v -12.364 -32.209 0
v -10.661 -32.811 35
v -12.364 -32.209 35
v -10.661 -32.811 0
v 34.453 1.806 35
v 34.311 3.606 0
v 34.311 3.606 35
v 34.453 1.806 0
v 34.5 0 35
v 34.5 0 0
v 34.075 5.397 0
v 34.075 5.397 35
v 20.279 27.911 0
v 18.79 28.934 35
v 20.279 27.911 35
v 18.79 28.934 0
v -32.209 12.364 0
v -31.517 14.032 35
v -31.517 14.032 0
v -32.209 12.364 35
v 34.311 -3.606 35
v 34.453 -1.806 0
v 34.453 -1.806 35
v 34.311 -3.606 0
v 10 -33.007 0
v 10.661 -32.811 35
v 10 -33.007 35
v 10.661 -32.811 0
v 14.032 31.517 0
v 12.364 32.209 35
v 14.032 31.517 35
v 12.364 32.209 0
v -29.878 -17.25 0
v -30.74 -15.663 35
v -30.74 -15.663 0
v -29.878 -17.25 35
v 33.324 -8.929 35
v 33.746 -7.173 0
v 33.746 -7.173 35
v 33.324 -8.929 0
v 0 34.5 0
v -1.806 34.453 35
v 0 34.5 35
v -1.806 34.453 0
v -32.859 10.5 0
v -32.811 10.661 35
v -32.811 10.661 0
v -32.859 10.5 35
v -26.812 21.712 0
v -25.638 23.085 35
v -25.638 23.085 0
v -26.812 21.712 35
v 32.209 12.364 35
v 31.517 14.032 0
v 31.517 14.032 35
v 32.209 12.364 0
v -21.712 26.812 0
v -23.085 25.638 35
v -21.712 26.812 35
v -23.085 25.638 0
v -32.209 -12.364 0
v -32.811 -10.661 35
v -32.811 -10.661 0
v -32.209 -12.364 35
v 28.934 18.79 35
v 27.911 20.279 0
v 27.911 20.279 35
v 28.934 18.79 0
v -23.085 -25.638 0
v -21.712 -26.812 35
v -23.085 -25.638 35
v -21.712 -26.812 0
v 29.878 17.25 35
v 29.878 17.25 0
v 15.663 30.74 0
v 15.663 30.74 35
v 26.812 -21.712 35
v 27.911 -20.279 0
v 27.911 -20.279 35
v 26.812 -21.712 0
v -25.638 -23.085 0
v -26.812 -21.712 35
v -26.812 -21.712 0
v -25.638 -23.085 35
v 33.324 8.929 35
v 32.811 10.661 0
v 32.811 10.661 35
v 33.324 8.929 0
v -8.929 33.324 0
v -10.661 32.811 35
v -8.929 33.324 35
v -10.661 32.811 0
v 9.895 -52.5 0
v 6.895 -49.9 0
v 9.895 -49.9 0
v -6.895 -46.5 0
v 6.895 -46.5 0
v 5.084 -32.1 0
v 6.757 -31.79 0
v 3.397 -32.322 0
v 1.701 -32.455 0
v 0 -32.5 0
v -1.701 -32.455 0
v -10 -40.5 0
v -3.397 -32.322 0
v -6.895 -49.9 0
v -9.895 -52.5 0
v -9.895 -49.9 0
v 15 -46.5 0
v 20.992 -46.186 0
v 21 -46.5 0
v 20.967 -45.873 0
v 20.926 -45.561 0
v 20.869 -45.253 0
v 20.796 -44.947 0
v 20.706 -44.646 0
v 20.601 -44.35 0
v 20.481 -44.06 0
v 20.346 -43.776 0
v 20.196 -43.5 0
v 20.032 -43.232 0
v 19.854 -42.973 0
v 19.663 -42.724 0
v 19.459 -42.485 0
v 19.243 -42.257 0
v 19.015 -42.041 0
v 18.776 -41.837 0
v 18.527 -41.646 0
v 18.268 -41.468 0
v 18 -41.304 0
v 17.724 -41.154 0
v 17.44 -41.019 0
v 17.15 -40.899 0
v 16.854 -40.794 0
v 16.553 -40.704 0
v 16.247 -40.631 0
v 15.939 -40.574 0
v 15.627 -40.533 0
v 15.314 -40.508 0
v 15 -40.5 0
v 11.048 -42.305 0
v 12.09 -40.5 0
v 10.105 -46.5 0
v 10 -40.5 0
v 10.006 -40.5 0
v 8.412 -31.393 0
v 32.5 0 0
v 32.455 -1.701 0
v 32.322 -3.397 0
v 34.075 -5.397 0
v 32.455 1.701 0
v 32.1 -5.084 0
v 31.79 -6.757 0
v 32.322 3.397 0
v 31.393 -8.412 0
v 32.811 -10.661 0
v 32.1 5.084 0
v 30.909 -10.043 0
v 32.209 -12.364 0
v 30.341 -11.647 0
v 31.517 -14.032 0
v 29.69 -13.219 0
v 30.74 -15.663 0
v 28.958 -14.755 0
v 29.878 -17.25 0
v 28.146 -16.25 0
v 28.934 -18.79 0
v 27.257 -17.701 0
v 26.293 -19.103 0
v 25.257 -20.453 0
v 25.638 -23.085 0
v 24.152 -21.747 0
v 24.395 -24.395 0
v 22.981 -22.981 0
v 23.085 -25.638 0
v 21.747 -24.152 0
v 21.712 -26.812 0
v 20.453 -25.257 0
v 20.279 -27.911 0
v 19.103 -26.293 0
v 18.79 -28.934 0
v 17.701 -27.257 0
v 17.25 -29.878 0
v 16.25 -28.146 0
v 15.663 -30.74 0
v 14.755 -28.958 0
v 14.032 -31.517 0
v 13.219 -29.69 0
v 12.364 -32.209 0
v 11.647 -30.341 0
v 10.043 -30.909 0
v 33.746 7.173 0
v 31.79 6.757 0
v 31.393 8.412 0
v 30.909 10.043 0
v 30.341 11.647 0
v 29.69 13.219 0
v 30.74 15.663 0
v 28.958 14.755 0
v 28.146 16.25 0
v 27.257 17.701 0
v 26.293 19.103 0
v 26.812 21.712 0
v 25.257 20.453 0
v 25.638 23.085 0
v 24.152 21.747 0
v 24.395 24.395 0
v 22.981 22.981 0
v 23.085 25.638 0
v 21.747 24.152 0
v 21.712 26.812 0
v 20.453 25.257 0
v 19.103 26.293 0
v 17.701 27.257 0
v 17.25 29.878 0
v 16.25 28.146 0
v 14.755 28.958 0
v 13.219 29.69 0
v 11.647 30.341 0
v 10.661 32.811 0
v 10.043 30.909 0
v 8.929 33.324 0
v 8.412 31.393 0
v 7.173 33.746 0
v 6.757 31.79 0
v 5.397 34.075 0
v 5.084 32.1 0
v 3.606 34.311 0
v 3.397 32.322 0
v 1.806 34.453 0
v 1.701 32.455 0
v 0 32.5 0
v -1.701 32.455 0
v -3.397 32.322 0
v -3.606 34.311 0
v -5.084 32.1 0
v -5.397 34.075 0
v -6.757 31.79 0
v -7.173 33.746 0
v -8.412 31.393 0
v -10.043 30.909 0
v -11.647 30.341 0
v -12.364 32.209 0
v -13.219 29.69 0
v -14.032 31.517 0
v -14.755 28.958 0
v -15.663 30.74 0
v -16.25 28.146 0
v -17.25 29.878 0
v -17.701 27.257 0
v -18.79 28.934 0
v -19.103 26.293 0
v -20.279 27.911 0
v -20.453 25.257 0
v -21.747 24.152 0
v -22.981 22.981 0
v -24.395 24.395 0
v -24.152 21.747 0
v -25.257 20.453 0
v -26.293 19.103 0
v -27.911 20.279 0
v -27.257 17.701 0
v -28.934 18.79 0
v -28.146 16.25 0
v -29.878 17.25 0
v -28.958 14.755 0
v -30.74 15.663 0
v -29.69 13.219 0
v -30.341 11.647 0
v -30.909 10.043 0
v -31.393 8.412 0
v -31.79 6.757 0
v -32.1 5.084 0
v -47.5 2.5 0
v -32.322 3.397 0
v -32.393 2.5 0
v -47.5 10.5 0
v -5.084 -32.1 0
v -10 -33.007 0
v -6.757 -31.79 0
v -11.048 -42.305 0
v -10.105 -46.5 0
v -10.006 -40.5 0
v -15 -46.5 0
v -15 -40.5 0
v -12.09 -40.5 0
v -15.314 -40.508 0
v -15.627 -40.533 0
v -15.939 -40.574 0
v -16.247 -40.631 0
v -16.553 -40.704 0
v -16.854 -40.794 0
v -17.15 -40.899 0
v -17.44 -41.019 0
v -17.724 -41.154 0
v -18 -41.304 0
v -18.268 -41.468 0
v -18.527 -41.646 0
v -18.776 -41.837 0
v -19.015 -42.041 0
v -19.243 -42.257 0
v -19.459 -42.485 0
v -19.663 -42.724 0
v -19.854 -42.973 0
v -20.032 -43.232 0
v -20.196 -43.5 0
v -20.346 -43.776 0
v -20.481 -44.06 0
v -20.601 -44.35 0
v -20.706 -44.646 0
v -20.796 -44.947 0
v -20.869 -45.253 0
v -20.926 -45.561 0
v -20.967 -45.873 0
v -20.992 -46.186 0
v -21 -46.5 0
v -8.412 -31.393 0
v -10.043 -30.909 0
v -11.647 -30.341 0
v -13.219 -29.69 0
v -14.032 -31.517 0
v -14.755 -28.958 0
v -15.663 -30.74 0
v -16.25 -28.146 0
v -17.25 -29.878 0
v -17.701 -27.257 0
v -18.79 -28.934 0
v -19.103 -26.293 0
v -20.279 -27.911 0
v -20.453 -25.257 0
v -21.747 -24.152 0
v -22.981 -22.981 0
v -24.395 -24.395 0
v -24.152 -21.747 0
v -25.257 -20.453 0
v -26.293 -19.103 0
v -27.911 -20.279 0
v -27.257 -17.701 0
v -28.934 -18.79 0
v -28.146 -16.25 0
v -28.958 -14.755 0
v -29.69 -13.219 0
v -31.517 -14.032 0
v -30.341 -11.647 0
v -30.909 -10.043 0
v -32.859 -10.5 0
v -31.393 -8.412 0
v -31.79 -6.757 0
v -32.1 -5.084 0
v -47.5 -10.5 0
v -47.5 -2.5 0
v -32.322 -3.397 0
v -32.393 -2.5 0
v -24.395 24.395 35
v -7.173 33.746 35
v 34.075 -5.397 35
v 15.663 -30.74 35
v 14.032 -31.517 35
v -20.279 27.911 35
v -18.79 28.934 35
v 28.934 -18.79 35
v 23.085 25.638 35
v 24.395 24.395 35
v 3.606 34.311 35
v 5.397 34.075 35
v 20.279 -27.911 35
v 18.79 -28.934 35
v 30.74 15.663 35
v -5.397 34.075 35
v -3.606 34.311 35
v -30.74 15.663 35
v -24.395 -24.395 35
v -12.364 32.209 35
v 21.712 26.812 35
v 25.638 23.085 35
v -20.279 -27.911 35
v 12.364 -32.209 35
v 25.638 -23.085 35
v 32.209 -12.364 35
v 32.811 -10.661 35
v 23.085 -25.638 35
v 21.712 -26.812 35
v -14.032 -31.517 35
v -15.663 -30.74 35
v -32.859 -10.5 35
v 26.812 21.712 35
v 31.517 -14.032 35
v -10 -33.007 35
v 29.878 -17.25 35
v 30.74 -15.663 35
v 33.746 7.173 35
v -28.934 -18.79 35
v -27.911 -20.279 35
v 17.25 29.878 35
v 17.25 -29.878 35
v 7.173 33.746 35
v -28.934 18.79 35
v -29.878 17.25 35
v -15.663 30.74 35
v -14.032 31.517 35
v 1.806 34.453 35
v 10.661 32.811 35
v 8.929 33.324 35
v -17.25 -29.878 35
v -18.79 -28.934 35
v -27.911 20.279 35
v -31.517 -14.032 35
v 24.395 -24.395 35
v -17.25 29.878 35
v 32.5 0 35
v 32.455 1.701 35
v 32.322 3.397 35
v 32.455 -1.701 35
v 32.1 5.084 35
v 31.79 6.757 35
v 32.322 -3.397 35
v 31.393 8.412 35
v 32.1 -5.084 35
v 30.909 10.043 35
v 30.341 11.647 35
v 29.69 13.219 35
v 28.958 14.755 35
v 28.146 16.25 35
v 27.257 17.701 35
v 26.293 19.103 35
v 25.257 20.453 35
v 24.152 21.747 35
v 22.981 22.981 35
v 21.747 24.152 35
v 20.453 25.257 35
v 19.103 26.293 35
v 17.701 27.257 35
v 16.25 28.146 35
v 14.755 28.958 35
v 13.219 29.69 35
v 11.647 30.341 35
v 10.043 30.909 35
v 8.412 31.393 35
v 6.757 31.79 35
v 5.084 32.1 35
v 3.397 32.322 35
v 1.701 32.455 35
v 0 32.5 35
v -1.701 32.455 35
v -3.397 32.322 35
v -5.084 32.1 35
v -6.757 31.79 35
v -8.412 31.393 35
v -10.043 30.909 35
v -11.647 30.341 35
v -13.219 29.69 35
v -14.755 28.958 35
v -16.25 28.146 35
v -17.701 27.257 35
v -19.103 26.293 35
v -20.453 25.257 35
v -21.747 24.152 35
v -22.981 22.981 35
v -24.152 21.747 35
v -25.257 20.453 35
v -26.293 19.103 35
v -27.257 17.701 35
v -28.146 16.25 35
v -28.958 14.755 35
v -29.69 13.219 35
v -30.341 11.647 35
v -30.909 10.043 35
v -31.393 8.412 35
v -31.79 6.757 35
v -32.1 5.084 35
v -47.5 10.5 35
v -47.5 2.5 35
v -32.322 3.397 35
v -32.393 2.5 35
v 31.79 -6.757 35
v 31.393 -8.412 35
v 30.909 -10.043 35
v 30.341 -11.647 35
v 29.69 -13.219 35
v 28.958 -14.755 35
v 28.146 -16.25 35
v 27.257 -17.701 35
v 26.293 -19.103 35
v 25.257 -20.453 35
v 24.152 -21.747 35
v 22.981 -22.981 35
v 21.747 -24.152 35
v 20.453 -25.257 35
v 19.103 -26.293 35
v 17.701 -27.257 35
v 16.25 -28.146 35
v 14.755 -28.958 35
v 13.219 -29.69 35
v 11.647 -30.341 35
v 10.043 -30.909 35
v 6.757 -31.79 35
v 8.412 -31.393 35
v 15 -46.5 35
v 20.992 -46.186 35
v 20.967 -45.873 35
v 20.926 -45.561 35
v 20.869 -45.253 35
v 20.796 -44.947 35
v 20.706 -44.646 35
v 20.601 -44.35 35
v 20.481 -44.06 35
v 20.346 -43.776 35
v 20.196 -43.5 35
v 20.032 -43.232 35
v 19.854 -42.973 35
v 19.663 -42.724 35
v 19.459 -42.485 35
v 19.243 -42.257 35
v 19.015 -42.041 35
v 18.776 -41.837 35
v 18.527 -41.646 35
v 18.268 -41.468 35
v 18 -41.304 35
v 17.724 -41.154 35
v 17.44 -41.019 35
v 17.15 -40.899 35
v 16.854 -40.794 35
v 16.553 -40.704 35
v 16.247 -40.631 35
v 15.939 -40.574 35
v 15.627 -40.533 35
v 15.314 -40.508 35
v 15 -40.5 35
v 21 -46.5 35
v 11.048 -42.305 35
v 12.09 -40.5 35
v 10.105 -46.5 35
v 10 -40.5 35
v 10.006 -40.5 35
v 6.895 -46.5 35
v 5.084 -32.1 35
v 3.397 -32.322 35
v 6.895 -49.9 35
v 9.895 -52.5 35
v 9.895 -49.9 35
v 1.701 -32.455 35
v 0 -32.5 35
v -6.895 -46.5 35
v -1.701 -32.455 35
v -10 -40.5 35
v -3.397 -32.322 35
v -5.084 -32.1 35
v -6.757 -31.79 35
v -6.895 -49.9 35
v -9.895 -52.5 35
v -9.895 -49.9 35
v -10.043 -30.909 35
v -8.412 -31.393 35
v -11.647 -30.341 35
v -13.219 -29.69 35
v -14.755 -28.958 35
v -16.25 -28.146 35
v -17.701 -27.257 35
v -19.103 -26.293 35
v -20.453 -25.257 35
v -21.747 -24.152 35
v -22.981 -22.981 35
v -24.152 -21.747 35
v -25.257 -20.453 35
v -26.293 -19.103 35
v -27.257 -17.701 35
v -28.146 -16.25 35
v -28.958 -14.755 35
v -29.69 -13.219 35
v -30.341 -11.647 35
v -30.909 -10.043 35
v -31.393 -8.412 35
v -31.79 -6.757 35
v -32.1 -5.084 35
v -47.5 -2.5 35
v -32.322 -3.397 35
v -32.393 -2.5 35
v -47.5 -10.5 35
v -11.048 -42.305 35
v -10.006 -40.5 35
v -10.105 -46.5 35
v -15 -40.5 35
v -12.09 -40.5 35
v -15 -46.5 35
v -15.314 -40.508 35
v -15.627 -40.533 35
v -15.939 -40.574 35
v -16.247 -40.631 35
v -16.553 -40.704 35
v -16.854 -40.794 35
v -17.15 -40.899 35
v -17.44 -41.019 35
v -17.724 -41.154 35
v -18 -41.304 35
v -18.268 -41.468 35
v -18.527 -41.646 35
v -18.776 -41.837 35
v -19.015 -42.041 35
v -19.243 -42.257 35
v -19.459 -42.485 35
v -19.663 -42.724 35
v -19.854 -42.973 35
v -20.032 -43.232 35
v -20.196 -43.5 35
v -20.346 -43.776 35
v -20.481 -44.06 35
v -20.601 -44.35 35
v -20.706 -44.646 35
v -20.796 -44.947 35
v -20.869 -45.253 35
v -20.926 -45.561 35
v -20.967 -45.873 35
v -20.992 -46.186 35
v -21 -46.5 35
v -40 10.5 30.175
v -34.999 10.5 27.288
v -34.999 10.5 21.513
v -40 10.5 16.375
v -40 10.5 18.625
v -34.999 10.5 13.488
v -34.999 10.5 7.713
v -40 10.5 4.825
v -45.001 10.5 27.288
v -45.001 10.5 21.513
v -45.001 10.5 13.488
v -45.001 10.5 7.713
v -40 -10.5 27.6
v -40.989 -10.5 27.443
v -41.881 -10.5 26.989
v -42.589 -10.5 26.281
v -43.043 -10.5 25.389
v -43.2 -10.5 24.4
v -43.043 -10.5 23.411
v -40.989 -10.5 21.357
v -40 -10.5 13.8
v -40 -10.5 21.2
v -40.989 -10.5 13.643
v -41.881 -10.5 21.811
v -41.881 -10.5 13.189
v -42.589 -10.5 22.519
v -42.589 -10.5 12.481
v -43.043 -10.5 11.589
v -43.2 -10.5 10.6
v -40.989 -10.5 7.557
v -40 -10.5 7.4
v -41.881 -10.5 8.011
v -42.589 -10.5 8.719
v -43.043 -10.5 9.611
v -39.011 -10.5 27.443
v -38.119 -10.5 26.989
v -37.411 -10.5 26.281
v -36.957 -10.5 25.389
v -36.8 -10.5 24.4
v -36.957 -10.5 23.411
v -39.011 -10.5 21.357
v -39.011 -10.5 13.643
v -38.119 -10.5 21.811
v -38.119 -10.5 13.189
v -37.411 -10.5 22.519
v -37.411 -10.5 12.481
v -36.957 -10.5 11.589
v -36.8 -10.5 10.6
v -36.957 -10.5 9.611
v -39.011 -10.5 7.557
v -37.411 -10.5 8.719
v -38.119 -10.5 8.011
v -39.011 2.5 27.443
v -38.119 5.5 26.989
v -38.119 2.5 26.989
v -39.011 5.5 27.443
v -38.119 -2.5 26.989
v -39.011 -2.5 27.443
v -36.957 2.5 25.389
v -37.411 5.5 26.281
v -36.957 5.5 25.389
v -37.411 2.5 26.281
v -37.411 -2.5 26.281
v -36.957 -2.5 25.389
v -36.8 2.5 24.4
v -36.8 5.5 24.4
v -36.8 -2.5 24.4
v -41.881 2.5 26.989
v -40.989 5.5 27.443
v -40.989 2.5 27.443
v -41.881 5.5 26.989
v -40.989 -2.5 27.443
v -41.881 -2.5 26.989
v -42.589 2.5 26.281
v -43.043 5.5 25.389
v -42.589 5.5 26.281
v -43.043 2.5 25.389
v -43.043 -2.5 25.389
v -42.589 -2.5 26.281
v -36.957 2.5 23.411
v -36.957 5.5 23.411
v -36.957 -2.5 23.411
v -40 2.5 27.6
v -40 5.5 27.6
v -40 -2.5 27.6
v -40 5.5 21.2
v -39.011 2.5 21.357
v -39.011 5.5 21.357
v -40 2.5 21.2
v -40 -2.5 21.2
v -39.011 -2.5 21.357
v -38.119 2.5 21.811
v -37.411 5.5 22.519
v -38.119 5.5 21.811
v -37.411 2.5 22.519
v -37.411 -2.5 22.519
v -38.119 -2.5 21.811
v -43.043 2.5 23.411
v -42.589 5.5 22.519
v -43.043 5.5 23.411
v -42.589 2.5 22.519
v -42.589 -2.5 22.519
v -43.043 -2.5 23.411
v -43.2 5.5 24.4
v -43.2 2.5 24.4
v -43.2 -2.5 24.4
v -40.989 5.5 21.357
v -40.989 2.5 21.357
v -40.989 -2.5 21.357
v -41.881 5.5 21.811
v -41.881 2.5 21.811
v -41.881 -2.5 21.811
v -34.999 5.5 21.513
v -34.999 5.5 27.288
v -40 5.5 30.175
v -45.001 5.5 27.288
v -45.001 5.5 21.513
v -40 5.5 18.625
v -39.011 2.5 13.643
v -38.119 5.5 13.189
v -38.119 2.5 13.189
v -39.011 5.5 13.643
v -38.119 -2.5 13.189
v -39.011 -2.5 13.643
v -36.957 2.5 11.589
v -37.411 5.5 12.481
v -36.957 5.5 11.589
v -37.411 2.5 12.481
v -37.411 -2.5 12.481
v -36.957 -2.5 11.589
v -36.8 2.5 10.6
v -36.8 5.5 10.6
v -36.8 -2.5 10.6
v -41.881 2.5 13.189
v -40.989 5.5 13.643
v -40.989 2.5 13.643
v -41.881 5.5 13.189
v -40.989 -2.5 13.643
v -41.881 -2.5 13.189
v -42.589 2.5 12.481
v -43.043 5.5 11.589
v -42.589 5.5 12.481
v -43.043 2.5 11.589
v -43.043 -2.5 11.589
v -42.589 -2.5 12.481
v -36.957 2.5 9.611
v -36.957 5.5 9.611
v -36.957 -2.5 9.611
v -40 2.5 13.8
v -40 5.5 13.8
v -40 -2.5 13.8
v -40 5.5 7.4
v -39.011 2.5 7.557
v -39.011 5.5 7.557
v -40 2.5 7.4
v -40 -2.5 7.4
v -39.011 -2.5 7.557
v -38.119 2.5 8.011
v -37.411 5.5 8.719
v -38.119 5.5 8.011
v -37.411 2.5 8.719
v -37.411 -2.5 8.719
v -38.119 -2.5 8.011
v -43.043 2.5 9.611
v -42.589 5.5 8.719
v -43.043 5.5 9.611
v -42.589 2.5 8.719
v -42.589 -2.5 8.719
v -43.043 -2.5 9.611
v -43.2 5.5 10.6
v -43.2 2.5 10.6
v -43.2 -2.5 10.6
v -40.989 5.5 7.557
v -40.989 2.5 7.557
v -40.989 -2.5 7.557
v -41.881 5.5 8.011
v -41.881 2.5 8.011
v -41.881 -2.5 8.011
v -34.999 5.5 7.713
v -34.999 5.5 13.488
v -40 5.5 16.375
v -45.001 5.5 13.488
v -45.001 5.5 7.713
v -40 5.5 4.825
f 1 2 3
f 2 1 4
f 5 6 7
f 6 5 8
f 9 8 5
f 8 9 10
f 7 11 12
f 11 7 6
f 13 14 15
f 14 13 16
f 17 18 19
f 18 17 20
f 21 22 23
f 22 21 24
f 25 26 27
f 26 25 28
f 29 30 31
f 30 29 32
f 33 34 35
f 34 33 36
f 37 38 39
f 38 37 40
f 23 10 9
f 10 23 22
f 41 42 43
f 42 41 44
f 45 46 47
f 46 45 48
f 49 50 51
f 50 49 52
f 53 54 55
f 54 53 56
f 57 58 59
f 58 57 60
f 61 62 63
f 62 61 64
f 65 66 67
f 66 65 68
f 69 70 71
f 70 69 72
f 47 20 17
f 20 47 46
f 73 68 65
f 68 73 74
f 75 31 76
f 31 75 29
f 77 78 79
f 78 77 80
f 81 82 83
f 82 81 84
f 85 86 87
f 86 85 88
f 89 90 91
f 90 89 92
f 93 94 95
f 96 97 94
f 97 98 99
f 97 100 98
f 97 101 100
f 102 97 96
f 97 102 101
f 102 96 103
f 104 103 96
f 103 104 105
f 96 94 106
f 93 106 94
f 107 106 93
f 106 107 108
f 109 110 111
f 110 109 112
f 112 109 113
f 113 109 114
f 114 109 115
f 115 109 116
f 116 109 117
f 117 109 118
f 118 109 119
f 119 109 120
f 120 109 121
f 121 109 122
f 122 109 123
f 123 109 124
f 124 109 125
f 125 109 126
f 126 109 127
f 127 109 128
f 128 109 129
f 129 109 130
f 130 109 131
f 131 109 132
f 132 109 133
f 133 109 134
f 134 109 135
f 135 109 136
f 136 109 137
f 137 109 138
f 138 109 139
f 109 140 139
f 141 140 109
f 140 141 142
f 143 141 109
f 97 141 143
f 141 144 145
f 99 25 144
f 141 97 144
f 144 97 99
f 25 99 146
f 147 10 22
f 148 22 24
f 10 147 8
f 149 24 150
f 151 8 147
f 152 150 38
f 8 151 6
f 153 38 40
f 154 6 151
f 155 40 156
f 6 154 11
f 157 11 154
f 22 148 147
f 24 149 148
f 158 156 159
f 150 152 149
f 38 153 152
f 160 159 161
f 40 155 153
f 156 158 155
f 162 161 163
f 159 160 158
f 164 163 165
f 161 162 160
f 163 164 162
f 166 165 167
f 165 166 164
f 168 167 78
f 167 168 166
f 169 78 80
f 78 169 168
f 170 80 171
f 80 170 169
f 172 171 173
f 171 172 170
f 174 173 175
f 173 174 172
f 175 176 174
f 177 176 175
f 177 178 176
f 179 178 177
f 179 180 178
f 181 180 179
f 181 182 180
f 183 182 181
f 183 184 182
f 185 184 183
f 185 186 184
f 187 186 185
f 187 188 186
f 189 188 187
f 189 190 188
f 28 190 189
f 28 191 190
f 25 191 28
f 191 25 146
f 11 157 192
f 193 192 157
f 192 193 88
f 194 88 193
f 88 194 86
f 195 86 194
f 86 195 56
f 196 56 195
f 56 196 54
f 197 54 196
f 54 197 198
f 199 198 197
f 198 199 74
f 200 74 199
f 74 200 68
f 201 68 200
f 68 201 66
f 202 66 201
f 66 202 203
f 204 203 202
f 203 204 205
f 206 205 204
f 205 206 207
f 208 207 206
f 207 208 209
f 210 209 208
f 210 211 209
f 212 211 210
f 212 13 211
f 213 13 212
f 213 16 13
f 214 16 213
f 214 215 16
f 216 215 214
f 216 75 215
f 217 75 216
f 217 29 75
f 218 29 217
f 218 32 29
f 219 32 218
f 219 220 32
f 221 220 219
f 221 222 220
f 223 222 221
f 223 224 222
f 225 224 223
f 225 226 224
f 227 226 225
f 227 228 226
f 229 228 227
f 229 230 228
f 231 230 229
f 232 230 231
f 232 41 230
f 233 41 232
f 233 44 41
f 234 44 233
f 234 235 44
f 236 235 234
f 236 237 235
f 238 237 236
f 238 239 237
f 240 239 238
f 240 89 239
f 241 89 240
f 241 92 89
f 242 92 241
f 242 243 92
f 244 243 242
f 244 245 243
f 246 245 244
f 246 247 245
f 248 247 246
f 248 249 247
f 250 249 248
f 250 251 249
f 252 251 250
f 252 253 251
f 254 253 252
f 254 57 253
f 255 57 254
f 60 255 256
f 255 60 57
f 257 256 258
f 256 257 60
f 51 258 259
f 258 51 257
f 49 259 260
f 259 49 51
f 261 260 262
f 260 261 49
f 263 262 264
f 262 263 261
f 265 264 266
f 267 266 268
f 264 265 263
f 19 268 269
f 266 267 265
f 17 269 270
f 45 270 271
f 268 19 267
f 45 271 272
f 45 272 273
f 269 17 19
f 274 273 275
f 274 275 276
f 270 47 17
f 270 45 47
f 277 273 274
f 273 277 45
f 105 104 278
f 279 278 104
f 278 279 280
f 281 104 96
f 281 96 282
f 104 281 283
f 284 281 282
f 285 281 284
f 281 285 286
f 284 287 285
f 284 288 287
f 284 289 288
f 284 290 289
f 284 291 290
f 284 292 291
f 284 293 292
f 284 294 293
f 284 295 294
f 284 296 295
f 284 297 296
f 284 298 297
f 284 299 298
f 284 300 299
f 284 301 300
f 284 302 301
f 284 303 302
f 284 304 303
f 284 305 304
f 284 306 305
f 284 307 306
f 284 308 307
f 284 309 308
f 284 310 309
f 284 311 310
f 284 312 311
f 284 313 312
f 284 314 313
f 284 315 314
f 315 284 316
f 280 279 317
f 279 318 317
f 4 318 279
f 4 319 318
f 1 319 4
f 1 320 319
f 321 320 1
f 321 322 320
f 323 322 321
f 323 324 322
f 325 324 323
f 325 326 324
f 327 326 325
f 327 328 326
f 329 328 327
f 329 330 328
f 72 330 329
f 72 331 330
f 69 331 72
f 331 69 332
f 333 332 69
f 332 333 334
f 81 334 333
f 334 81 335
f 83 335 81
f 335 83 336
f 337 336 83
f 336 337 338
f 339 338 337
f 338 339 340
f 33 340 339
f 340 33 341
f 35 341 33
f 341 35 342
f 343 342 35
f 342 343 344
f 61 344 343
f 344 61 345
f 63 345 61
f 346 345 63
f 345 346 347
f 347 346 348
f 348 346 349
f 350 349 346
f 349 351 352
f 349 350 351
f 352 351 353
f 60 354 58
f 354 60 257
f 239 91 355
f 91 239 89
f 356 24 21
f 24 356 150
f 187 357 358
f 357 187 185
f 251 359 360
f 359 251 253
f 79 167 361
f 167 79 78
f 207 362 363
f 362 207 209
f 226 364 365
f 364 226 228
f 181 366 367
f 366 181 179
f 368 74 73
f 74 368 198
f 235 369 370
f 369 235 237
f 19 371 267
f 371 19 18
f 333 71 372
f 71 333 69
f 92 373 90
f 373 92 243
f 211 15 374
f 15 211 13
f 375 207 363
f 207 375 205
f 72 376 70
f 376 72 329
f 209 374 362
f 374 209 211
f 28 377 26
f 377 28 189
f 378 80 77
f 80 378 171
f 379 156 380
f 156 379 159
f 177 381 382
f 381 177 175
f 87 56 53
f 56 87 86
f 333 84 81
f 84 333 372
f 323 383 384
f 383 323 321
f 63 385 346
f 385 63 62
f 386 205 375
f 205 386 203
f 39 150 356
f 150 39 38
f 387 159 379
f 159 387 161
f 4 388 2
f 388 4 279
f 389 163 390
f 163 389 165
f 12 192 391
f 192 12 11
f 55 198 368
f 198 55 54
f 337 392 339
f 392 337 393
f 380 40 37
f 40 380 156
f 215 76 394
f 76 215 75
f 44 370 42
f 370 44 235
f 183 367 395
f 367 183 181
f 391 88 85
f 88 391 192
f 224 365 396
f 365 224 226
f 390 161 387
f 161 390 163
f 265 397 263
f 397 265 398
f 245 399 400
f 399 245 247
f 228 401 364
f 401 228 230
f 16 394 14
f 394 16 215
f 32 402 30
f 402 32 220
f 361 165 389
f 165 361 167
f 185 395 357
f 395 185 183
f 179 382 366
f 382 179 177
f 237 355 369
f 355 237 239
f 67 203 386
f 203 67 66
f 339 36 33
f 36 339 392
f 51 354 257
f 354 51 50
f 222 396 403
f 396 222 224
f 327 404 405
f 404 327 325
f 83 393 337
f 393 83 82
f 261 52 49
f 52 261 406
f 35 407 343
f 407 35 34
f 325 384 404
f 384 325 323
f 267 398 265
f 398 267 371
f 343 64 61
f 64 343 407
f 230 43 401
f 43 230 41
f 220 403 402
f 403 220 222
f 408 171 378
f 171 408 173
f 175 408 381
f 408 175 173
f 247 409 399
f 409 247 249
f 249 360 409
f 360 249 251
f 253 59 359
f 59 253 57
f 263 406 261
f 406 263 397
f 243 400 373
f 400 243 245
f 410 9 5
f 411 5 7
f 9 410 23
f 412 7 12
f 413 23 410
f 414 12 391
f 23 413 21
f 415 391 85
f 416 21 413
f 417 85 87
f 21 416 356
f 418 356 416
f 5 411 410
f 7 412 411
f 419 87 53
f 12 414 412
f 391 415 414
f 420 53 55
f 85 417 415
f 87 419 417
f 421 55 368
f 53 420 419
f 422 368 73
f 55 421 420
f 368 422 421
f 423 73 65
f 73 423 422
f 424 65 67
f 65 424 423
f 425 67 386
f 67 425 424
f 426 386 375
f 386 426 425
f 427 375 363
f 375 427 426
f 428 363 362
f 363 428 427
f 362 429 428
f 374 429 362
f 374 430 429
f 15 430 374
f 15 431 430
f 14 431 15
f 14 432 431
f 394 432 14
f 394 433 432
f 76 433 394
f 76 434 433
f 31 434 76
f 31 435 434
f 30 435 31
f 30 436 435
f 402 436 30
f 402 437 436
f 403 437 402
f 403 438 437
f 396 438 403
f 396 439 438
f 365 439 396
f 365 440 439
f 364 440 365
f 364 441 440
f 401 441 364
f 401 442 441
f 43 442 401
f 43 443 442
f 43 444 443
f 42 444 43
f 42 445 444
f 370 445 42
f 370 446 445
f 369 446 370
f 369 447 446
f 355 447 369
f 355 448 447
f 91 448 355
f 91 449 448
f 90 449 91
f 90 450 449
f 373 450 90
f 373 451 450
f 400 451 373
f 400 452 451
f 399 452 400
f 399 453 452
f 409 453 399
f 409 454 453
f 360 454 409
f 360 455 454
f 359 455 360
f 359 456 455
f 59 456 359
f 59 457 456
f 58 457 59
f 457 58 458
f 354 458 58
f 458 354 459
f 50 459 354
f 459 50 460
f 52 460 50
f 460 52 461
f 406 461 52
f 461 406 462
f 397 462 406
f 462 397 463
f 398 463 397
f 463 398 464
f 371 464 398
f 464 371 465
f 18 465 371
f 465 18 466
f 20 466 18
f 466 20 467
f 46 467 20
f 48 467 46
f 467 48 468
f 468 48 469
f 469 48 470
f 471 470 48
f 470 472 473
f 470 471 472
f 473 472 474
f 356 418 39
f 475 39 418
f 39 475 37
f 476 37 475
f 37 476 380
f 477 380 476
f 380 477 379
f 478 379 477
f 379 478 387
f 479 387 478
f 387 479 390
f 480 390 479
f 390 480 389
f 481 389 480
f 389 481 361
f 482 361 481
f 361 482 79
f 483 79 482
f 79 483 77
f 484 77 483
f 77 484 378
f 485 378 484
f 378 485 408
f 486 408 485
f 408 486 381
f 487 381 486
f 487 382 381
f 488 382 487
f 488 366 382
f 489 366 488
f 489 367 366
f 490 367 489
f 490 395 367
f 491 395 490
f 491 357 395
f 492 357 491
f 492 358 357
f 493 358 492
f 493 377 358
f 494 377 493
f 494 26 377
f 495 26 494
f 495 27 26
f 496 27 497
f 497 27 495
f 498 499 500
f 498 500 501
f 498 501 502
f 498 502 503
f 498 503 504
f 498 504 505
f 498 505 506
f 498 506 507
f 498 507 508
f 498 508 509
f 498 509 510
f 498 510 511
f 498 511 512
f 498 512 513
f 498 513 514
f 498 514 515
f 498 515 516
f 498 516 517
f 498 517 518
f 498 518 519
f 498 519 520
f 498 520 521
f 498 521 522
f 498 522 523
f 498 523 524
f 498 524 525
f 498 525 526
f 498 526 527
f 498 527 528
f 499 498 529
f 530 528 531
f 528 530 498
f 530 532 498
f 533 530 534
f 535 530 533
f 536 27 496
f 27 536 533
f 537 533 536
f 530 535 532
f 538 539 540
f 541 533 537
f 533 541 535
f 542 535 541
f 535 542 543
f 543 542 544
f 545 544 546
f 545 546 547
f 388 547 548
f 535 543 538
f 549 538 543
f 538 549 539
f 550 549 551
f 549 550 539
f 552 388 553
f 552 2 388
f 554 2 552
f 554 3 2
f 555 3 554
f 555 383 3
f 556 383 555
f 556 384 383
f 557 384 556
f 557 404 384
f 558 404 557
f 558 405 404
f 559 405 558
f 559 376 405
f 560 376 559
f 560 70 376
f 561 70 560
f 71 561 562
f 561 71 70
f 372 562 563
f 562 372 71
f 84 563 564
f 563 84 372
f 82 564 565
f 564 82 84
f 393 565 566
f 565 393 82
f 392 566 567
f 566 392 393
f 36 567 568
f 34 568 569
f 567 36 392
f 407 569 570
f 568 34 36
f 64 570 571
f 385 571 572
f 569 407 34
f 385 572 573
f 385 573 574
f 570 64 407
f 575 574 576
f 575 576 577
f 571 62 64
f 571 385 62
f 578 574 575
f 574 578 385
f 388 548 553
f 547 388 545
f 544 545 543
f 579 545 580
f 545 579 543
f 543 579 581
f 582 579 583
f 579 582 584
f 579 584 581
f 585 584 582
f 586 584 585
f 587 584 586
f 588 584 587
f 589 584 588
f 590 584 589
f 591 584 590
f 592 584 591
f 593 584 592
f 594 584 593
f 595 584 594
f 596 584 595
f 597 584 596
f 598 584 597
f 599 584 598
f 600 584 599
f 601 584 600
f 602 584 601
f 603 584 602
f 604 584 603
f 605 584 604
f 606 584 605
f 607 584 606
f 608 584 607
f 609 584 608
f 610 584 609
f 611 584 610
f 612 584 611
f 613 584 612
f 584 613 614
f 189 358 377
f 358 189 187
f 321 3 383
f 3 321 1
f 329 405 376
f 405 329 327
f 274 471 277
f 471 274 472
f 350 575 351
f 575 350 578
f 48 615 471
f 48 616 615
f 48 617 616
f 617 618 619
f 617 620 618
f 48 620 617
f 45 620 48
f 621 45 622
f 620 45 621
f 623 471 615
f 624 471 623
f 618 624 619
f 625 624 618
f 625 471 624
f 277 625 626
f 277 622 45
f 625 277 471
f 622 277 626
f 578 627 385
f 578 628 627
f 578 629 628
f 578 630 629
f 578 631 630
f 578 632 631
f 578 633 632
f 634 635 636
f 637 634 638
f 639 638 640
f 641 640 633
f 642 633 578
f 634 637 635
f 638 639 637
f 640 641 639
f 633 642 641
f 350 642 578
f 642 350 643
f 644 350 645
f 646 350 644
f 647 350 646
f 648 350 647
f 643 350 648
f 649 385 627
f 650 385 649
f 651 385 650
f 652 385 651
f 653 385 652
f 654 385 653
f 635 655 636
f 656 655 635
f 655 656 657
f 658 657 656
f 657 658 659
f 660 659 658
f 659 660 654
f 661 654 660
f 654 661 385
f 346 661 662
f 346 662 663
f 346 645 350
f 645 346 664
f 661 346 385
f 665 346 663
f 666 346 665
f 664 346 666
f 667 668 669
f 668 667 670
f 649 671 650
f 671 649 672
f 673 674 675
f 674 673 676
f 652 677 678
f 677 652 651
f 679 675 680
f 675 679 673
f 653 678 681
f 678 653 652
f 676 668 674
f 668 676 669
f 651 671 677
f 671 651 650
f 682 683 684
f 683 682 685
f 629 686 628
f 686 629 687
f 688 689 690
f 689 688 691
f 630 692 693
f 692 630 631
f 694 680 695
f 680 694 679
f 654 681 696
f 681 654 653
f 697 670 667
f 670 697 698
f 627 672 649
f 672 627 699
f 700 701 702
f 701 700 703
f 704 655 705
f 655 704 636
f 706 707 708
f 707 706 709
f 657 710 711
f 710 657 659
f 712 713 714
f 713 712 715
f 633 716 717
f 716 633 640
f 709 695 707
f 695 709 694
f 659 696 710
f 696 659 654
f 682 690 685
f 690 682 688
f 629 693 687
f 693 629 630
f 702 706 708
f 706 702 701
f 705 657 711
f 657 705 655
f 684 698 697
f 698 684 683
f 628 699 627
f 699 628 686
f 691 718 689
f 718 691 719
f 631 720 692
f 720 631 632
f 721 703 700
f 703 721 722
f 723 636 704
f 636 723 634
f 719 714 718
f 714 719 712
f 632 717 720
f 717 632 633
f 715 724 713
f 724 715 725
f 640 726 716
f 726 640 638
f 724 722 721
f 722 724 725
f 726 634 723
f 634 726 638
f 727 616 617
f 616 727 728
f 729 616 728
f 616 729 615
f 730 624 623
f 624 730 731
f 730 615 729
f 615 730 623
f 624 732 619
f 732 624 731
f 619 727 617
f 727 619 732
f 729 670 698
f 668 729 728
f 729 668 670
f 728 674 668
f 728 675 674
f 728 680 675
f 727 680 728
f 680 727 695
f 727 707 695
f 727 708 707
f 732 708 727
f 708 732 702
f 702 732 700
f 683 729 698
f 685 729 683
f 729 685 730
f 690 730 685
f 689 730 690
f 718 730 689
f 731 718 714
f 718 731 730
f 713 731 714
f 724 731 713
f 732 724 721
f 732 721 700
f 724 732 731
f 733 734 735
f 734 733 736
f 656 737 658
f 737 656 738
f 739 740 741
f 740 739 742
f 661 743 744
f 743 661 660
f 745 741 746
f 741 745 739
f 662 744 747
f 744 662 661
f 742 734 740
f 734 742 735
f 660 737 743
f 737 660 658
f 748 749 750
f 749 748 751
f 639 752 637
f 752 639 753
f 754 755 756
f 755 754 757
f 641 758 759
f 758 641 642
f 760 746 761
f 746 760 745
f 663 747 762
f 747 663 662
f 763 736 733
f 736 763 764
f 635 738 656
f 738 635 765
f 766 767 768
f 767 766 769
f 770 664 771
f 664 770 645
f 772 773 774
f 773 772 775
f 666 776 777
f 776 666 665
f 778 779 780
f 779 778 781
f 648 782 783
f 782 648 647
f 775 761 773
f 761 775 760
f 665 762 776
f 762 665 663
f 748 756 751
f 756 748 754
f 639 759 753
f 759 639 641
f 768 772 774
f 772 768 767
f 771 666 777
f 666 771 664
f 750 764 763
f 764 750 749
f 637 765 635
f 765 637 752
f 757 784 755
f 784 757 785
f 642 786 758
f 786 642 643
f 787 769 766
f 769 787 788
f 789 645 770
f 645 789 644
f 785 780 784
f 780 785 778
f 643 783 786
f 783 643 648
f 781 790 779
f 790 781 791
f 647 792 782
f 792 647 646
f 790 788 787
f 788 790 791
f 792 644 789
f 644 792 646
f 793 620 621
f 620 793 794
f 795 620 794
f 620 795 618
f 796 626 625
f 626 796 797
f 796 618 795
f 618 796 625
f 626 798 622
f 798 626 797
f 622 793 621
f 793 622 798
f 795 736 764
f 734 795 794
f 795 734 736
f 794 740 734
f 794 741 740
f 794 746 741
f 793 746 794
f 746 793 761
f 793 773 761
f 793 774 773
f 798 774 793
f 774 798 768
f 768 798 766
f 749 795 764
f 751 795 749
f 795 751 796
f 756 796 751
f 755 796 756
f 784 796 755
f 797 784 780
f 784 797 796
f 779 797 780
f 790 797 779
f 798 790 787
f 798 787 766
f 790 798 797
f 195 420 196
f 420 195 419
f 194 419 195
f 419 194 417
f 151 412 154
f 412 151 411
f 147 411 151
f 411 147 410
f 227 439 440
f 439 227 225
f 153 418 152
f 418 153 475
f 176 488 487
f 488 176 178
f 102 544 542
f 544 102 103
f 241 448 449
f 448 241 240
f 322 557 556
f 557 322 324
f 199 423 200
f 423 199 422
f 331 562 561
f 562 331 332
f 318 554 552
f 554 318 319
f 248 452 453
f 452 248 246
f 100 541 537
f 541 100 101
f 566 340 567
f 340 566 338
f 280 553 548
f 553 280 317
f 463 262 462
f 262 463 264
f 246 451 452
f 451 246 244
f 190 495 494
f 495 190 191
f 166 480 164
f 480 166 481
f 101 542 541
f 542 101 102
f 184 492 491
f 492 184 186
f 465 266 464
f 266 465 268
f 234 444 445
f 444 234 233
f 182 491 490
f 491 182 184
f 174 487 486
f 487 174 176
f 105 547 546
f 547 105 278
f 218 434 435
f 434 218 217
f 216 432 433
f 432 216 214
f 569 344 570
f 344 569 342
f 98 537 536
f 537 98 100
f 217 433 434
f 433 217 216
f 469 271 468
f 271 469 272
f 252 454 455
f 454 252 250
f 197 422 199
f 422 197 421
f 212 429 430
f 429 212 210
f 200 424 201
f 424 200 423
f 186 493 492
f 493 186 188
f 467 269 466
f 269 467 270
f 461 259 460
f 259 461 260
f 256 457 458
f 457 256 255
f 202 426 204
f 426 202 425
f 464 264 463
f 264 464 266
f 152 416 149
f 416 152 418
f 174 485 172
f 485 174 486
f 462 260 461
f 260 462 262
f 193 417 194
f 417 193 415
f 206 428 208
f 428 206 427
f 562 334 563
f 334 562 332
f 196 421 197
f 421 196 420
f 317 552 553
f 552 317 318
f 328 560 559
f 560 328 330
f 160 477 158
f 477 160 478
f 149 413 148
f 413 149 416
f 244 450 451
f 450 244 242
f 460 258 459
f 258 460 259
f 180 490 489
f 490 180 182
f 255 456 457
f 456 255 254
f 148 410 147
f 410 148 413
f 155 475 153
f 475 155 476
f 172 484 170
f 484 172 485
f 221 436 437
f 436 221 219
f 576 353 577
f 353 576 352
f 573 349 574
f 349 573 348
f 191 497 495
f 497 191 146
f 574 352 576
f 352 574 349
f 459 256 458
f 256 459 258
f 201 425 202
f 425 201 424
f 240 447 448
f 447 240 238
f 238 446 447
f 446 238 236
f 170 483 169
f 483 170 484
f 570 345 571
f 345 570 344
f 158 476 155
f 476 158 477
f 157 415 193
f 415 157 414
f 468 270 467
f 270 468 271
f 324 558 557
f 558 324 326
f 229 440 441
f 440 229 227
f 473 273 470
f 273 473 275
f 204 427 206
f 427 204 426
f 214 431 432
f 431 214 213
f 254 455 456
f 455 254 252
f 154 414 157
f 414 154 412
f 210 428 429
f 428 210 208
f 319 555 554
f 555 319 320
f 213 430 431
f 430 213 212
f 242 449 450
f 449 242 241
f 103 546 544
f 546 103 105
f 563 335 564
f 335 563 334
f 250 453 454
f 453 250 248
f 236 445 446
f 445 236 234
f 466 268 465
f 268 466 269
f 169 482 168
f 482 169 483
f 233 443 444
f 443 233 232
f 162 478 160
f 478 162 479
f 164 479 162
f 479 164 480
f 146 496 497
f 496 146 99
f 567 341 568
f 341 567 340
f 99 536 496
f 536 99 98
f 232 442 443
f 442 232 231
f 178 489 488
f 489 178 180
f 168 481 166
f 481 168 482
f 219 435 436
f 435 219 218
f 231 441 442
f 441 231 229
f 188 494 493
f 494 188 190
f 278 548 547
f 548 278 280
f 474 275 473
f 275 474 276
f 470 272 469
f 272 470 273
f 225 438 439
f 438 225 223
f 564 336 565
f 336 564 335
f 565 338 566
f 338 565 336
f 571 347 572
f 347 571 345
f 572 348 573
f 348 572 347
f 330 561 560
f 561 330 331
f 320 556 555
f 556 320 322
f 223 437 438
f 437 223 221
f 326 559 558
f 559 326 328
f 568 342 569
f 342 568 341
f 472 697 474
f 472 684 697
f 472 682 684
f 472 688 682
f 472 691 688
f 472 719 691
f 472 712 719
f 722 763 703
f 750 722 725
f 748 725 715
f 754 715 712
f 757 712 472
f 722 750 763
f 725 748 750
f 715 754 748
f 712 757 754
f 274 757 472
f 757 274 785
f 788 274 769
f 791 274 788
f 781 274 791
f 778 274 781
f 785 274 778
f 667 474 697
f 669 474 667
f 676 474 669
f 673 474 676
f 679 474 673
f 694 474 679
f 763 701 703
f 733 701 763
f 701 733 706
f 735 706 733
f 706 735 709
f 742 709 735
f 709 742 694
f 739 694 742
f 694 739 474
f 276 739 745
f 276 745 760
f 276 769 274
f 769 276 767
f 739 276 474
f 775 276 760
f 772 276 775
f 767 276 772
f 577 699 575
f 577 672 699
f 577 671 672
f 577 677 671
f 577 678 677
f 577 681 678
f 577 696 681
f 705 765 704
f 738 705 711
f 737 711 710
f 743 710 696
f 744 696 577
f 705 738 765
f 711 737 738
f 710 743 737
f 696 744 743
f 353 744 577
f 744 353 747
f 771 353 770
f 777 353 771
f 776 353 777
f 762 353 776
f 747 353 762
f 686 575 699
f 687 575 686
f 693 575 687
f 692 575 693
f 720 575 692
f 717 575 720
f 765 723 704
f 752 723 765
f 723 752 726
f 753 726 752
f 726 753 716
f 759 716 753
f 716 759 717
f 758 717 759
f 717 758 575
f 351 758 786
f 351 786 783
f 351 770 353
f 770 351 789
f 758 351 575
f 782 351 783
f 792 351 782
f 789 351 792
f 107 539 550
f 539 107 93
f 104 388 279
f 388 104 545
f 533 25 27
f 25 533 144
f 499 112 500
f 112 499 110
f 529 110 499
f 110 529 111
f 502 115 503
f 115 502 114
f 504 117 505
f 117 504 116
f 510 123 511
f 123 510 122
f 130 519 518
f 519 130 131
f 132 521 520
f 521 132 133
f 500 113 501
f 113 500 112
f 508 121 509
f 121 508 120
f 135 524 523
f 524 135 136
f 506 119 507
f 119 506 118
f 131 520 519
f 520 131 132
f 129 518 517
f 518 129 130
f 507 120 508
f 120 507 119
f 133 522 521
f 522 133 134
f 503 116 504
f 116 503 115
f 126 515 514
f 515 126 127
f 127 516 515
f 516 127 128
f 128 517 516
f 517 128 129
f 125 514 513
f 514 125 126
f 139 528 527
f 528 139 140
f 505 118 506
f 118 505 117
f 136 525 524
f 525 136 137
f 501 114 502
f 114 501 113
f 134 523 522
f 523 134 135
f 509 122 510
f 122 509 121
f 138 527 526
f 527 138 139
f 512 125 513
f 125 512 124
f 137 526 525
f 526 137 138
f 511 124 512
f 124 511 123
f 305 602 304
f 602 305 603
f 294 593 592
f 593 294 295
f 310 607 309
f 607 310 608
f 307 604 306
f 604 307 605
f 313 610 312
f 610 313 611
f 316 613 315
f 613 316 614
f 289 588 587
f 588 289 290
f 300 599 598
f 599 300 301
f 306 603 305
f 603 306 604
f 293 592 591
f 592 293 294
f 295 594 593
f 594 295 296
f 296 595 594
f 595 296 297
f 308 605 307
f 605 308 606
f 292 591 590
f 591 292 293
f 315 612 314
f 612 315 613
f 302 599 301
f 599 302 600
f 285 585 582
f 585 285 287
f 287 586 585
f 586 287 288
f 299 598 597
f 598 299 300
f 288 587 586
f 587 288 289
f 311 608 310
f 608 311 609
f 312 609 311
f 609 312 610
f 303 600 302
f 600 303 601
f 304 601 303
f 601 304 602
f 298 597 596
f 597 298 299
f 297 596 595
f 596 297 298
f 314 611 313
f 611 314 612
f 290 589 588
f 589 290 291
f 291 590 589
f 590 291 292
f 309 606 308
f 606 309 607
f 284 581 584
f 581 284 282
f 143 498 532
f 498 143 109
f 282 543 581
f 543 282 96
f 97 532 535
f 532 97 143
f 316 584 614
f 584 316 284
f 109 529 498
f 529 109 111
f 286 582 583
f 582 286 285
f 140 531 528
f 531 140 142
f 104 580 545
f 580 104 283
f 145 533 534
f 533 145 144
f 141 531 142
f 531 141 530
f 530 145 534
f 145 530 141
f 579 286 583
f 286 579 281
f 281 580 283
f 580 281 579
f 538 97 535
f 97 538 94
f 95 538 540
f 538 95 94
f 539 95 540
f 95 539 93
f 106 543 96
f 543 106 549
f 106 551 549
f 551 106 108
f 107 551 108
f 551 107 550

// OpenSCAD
// file: parametric_clamp.scad
//Parametric clamp

/*
Parameters:
	base : Enable / disable clamp base
	base_thickness : Thickness of clamp base if enabled
	base_width : Width of clamp base if enabled
	ring_thickness : Tickness of clamp ring
	ring_inner_dia : Inner diameter of clamp ring
	jaws_thickness : Thickness of clamp jaws
	jaws_width : Width of clamp jaws
	break_width : Width of break in clamp jaws
	screw_diameter : Screw hole diameter
	screw_count : Screw hole count
	nut_recess : Enable / disable nut recess in clamp
	nut_diameter : Nut recess diameter
	nut_thickness : Nut recess depth
	height : Clamp height

translate([-25, 0, 25]) clamp();
translate([25, 0, 25]) clamp(base = false);
translate([-25, 0, -25]) clamp(screw_count = 2);
translate([25, 0, -25]) clamp(height = 25);
*/

module clamp(base = true, base_thickness = 2, base_width = 20, base_angle=0, ring_thickness = 2,
			 ring_inner_dia = 35, jaws_thickness = 5, jaws_width = 7, break_width = 5, 
			 screw_diameter = 3, screw_count = 1, nut_recess = true, nut_diameter = 6.5, nut_thickness = 3, height = 15) {

	//Check base thickness
	if(base && base_thickness < ring_thickness)
		echo("Base thickness must be at least ring thickness, ring will protrude through base");

	//Check jaws width
	if(jaws_width < ring_thickness)
		echo("Jaw width must be at least ring thickness, ring will protrude through jaws");

	//Calculate ring inner radius
	ring_inner_rad = ring_inner_dia / 2;

	//Calculate screw spacing
	screw_spacing = (height - (screw_diameter * screw_count)) / (screw_count + 1);

	//Base
	if(base)
		rotate([0,0,base_angle])
			translate([ring_inner_rad + (base_thickness / 2), 0, 0])
				cube([base_thickness, base_width, height], center=true);


	difference() {
		union() {
			//Outer cylinder
			cylinder(r=ring_inner_rad + ring_thickness, h=height, center=true);

			//Jaws
			translate([0 - ring_inner_rad - (jaws_width / 2), 0, 0])
				cube([jaws_width, (jaws_thickness * 2) + break_width, height], center=true);
		}
	
		//Inner cylinder
		cylinder(r=ring_inner_rad, h=height + 10, center=true);

		//Break
		translate([0 - ((jaws_width + ring_thickness + (ring_inner_dia / 2) + 10) / 2), 0, 0])
			cube([jaws_width + ring_thickness + (ring_inner_dia / 2) + 10, break_width, height + 10], center=true);

		//Screw hole(s)
		for(i = [1 : screw_count])
			translate([0 - (ring_inner_dia / 2) - (jaws_width / 2), 0, (height / 2) - (screw_diameter / 2) - (screw_spacing * i) - (screw_diameter * (i - 1))])
				rotate([90, 0, 0])
					union() {
						cylinder(r=screw_diameter / 2, h=jaws_thickness * 2 + break_width + 10, center=true, $fn=20);
						if(nut_recess) translate([0, 0, nut_thickness-((nut_thickness + 10)/2)-(break_width/2)-jaws_thickness]) rotate([0,0,90]) cylinder(r=nut_diameter/2, h=nut_thickness + 10, center=true, $fn=6);
					}
	}
}
// file: BOSL2/std.scad
// Minimal BOSL2 compatibility shim for bundled gallery models.
// It implements only the helpers used by the imported OpenSCAD projects.

CENTER = [0, 0, 0];
BOTTOM = [0, 0, -1];
TOP = [0, 0, 1];
LEFT = [-1, 0, 0];
RIGHT = [1, 0, 0];
FRONT = [0, -1, 0];
BACK = [0, 1, 0];

module up(z=0) {
    translate([0, 0, z]) children();
}

module down(z=0) {
    translate([0, 0, -z]) children();
}

module attach(anchor=CENTER) {
    children();
}

module cuboid(size=[1, 1, 1], anchor=CENTER) {
    center = anchor == CENTER;
    translate(center ? [0, 0, 0] : [0, 0, size[2] / 2])
        cube(size, center=true);
    children();
}

module xcyl(h=1, r=1, anchor=CENTER) {
    center = anchor == CENTER;
    translate(center ? [0, 0, 0] : [h / 2, 0, 0])
        rotate([0, 90, 0])
            cylinder(h=h, r=r, center=true);
}
// main file
include <BOSL2/std.scad>
include <parametric_clamp.scad>

$fn=120;
// clamp parameters
ring_inner_dia = 65;
clamp_height = 35;
fudge = 0.01;
base_width = 20;
base_depth = 20;
support_width = 5;
support_thickness = 6;
hook_stop_starting_depth = 3;
triangle_size = 1.0+0.2+fudge;

// parameters for pen holder
plate_connector_depth = 8;
base_grip_border_size = 4;
base_grip_inset = 6;
base_grip_distance = 2;
base_grip_center_depth = 3;
// parameters for pen cutout
pen_cutout_depth = 15;//needs to be a fixed distance for all pens
pen_extra_clasp_width = 1.5;//extra width beyond max pen diameter

fit_dist = 0.2;


pencil_diameter = [8, 8];// #2 pencil
pentel_diameter = [9.75, 9.75];// pentel
sharpie_diameter = [10.3, 11.15];//[10.5, 11.25] //fine point sharpie


module pen_clamp() {
    band_support_depth = base_width*0.4;
    difference() {
        union() {
            // clamp
            translate([0, 0, clamp_height/2.0]) 
                clamp(ring_inner_dia=ring_inner_dia, 
                        height = clamp_height, 
                        base_thickness=base_depth, 
                        base_angle=-90, 
                        screw_count = 2, 
                        screw_diameter= 6.4, // add in some fudge for fit
                        nut_thickness = 5, 
                        nut_diameter = 11.55, 
                        jaws_width = 15, 
                        jaws_thickness=8);
            // band holder supports
            translate([0,-ring_inner_dia/2.0-band_support_depth, clamp_height/2.0])
                difference()
                {
                    union() {
                        // support - hook stop
                        translate([0,-hook_stop_starting_depth, 0])
                            cube([base_width+support_width*2, support_thickness, clamp_height], center=true);//, rounding=1, edges = ["X", "Y", "Z"]);
                        // rounded edges
                        translate([0, -(hook_stop_starting_depth+support_thickness/2.0), 0]) {
                            difference() {
                                union() {
                                    translate([base_width/2.0+support_width, 0, 0])
                                        cylinder(r=support_thickness, h=clamp_height, center=true);
                                    translate([-(base_width/2.0+support_width), 0, 0])
                                        cylinder(r=support_thickness, h=clamp_height, center=true);
                                }
                                translate([0,-support_thickness/2.0, 0])
                                    cube([base_width+support_width*2+support_thickness*2, support_thickness, clamp_height+fudge*2], center=true);
                            }
                        }
                    }
                    // indents for hooking hooks
                    color("blue") {
                        translate([base_width/2.0+triangle_size*sin(60), 0, 0])
                            rotate([0, 0, -90])
                                translate([triangle_size*sin(30)-fudge, 0, 0])
                                    cylinder(r=triangle_size, h=clamp_height+fudge*2, center=true, $fn=3);
                        scale([-1, 1, 1])
                            translate([base_width/2.0+triangle_size*sin(60), 0, 0])
                                rotate([0, 0, -90])
                                    translate([triangle_size*sin(30)-fudge, 0, 0])
                                        cylinder(r=triangle_size, h=clamp_height+fudge*2, center=true, $fn=3);
                    }
                }
        }
        // cutout inset for grips
        color("blue")  {
            front_of_band_support = -ring_inner_dia/2.0-band_support_depth-support_thickness/2.0-hook_stop_starting_depth;            
            translate([base_width/2.0, front_of_band_support, clamp_height/2.0]) {
                translate([-base_grip_inset/4.0,-base_grip_center_depth/2.0-fit_dist, 0])
                    cube([base_grip_inset/2.0+fudge+fit_dist, base_grip_center_depth+fit_dist*2, clamp_height+fudge*2], center=true);
                translate([0,-base_grip_center_depth-base_grip_center_depth/2.0-fit_dist, 0])
                    cube([fudge+fit_dist, base_grip_center_depth+fit_dist*2, clamp_height+fudge*2], center=true);
            }
            scale([-1,1,1])
                translate([base_width/2.0, front_of_band_support, clamp_height/2.0]) {
                    translate([-base_grip_inset/4.0,-base_grip_center_depth/2.0-fit_dist, 0])
                        cube([base_grip_inset/2.0+fudge+fit_dist, base_grip_center_depth+fit_dist*2, clamp_height+fudge*2], center=true);
                    translate([0,-base_grip_center_depth-base_grip_center_depth/2.0-fit_dist, 0])
                        cube([fudge+fit_dist, base_grip_center_depth+fit_dist*2, clamp_height+fudge*2], center=true);
                }
        }
    }
}


module band_holder() {
    base_width = 20;
    support_width = 5;
    support_depth = 7;
    support_thickness = 6;
    hook_stop_starting_depth = 3;
    triangle_size = 1.0+fudge;

    translate([ring_inner_dia/2.0+base_width/2, 0, clamp_height/2.0])
        color("blue") 
        {
            union() {
                // support - hook stop
                band_holder_thickness = 3;
                translate([-band_holder_thickness/2.0, base_width/2.0+band_holder_thickness/2.0, 0])
                    cube([band_holder_thickness, band_holder_thickness, clamp_height], center=true);
                translate([-band_holder_thickness/2.0, base_width/2.0+support_width, 0]) {
                    cuboid([band_holder_thickness, support_width*2, clamp_height+4], rounding=1, edges = ["X", "Y", "Z"]);
                    translate([band_holder_thickness/2.0-support_depth/2.0, -support_width+band_holder_thickness/2.0, 0]) 
                        rotate([0,0,90])
                            cuboid([band_holder_thickness, support_depth, clamp_height+4], rounding=1, edges = ["X", "Y", "Z"]);
                    translate([band_holder_thickness/2.0-support_depth/2.0, support_width-band_holder_thickness/2.0, 0]) 
                        rotate([0,0,90])
                            cuboid([band_holder_thickness, support_depth, clamp_height+4], rounding=1, edges = ["X", "Y", "Z"]);
                }
            }
            // indents for hooking hooks
            difference() 
            {
                translate([0, base_width/2.0+triangle_size*sin(60), 0])
                    translate([triangle_size*sin(30)-fudge,0,0])
                cylinder(r=triangle_size, h=clamp_height, center=true, $fn=3);
                cutout_size = 10;
                color("white") {
                    translate([((cutout_size)/2/sin(45)), base_width/2.0+triangle_size*sin(60), -clamp_height/2.0])
                        rotate([0, 45, 0])
                            cube([cutout_size, cutout_size, cutout_size], center=true);
                    translate([((cutout_size)/2/sin(45)), base_width/2.0+triangle_size*sin(60), clamp_height/2.0])
                        rotate([0, 45, 0])
                            cube([cutout_size, cutout_size, cutout_size], center=true);
                }
            }
        }
}


module pen_holder(fn, pen_diameter, pen_grip_percent=0.3) {
    max_pen_diameter = max(pen_diameter[0], pen_diameter[1]);
    pen_grip_depth = max_pen_diameter*pen_grip_percent;
    slide_in_cutout_depth = pen_cutout_depth+(max_pen_diameter*0.7)/2.0;
    
    translate([0, 0, clamp_height/2.0+base_grip_border_size/2.0]) {
        difference() {
            union() {
                // large backing
                translate([0, plate_connector_depth/2.0, 0])
                    cube([base_width+base_grip_border_size, plate_connector_depth, clamp_height+base_grip_border_size], center=true);
                // pen bump
                translate([0, plate_connector_depth+(pen_cutout_depth-plate_connector_depth)/2, 0])
                    cube([max_pen_diameter+pen_extra_clasp_width, pen_cutout_depth-plate_connector_depth, clamp_height+base_grip_border_size], center=true);
            }
            // pen holder cutout
            translate([0, pen_cutout_depth, 0])
                cylinder(r1=pen_diameter[0]/2.0, r2=pen_diameter[1]/2.0, h=clamp_height+base_grip_border_size+fudge*2, center=true, $fn=fn);
            // back grip cutout
            color("blue")
                translate([0, base_grip_distance/2.0, base_grip_border_size/4+fudge])
                    cube([base_width-base_grip_inset, base_grip_distance+fudge, clamp_height+base_grip_border_size/2.0+fudge*2], center=true);
            // back middle cutout
            translate([0, base_grip_distance+base_grip_center_depth/2.0, base_grip_border_size/4])
                cube([base_width+0.1, base_grip_center_depth+fudge, clamp_height+base_grip_border_size/2.0+fudge*2], center=true);
        }
        difference() {
            union() {
                // pen bump
                // distance from half of backing to pen_clasp_overhang percent of pen diameter
                translate([0, pen_cutout_depth+pen_grip_depth/2, 0])
                    cube([max_pen_diameter+pen_extra_clasp_width, pen_grip_depth, clamp_height+base_grip_border_size], center=true);
            }
            // pen holder cutout
            translate([0, pen_cutout_depth, 0])
                scale([1, 0.9, 1])
                    cylinder(r1=pen_diameter[0]/2.0, r2=pen_diameter[1]/2.0, h=clamp_height+base_grip_border_size+fudge*2, center=true, $fn=fn);
            // slide in cutout, angled cutout to allow for pens to snap in easily
            translate([0, slide_in_cutout_depth, 0])
                cylinder(r=(max_pen_diameter+pen_extra_clasp_width)/2.0, h=clamp_height+base_grip_border_size+fudge*2, center=true, $fn=6);
        }
    }
}


module all_the_pens() {
    translate([0, 100, 0]) {
        spacing = 30;
        pen_holder(fn=4, pen_diameter=sharpie_diameter, pen_grip_percent=0);// triagle
        translate([spacing, 0, 0]) pen_holder(fn=120, pen_diameter=sharpie_diameter);//fine point sharpie
        translate([-spacing, 0, 0]) pen_holder(fn=120, pen_diameter=pentel_diameter);// pentel rsvp
        translate([0, spacing, 0]) pen_holder(fn=6, pen_diameter=pencil_diameter);//#2 pencil
    }
}

module reference_pen_holder() {
    translate([0,-ring_inner_dia/2.0-base_width+base_grip_distance+base_grip_center_depth-0.1, clamp_height+base_grip_border_size/2.0])
        scale([1,-1,-1])
            color("purple")
                pen_holder(fn=4, pen_diameter=sharpie_diameter, pen_grip_percent=0);// triagle
}
//band_holder();
pen_clamp();
//reference_pen_holder();
//all_the_pens();

// reference pen hoilder with clamp
/*
*/
